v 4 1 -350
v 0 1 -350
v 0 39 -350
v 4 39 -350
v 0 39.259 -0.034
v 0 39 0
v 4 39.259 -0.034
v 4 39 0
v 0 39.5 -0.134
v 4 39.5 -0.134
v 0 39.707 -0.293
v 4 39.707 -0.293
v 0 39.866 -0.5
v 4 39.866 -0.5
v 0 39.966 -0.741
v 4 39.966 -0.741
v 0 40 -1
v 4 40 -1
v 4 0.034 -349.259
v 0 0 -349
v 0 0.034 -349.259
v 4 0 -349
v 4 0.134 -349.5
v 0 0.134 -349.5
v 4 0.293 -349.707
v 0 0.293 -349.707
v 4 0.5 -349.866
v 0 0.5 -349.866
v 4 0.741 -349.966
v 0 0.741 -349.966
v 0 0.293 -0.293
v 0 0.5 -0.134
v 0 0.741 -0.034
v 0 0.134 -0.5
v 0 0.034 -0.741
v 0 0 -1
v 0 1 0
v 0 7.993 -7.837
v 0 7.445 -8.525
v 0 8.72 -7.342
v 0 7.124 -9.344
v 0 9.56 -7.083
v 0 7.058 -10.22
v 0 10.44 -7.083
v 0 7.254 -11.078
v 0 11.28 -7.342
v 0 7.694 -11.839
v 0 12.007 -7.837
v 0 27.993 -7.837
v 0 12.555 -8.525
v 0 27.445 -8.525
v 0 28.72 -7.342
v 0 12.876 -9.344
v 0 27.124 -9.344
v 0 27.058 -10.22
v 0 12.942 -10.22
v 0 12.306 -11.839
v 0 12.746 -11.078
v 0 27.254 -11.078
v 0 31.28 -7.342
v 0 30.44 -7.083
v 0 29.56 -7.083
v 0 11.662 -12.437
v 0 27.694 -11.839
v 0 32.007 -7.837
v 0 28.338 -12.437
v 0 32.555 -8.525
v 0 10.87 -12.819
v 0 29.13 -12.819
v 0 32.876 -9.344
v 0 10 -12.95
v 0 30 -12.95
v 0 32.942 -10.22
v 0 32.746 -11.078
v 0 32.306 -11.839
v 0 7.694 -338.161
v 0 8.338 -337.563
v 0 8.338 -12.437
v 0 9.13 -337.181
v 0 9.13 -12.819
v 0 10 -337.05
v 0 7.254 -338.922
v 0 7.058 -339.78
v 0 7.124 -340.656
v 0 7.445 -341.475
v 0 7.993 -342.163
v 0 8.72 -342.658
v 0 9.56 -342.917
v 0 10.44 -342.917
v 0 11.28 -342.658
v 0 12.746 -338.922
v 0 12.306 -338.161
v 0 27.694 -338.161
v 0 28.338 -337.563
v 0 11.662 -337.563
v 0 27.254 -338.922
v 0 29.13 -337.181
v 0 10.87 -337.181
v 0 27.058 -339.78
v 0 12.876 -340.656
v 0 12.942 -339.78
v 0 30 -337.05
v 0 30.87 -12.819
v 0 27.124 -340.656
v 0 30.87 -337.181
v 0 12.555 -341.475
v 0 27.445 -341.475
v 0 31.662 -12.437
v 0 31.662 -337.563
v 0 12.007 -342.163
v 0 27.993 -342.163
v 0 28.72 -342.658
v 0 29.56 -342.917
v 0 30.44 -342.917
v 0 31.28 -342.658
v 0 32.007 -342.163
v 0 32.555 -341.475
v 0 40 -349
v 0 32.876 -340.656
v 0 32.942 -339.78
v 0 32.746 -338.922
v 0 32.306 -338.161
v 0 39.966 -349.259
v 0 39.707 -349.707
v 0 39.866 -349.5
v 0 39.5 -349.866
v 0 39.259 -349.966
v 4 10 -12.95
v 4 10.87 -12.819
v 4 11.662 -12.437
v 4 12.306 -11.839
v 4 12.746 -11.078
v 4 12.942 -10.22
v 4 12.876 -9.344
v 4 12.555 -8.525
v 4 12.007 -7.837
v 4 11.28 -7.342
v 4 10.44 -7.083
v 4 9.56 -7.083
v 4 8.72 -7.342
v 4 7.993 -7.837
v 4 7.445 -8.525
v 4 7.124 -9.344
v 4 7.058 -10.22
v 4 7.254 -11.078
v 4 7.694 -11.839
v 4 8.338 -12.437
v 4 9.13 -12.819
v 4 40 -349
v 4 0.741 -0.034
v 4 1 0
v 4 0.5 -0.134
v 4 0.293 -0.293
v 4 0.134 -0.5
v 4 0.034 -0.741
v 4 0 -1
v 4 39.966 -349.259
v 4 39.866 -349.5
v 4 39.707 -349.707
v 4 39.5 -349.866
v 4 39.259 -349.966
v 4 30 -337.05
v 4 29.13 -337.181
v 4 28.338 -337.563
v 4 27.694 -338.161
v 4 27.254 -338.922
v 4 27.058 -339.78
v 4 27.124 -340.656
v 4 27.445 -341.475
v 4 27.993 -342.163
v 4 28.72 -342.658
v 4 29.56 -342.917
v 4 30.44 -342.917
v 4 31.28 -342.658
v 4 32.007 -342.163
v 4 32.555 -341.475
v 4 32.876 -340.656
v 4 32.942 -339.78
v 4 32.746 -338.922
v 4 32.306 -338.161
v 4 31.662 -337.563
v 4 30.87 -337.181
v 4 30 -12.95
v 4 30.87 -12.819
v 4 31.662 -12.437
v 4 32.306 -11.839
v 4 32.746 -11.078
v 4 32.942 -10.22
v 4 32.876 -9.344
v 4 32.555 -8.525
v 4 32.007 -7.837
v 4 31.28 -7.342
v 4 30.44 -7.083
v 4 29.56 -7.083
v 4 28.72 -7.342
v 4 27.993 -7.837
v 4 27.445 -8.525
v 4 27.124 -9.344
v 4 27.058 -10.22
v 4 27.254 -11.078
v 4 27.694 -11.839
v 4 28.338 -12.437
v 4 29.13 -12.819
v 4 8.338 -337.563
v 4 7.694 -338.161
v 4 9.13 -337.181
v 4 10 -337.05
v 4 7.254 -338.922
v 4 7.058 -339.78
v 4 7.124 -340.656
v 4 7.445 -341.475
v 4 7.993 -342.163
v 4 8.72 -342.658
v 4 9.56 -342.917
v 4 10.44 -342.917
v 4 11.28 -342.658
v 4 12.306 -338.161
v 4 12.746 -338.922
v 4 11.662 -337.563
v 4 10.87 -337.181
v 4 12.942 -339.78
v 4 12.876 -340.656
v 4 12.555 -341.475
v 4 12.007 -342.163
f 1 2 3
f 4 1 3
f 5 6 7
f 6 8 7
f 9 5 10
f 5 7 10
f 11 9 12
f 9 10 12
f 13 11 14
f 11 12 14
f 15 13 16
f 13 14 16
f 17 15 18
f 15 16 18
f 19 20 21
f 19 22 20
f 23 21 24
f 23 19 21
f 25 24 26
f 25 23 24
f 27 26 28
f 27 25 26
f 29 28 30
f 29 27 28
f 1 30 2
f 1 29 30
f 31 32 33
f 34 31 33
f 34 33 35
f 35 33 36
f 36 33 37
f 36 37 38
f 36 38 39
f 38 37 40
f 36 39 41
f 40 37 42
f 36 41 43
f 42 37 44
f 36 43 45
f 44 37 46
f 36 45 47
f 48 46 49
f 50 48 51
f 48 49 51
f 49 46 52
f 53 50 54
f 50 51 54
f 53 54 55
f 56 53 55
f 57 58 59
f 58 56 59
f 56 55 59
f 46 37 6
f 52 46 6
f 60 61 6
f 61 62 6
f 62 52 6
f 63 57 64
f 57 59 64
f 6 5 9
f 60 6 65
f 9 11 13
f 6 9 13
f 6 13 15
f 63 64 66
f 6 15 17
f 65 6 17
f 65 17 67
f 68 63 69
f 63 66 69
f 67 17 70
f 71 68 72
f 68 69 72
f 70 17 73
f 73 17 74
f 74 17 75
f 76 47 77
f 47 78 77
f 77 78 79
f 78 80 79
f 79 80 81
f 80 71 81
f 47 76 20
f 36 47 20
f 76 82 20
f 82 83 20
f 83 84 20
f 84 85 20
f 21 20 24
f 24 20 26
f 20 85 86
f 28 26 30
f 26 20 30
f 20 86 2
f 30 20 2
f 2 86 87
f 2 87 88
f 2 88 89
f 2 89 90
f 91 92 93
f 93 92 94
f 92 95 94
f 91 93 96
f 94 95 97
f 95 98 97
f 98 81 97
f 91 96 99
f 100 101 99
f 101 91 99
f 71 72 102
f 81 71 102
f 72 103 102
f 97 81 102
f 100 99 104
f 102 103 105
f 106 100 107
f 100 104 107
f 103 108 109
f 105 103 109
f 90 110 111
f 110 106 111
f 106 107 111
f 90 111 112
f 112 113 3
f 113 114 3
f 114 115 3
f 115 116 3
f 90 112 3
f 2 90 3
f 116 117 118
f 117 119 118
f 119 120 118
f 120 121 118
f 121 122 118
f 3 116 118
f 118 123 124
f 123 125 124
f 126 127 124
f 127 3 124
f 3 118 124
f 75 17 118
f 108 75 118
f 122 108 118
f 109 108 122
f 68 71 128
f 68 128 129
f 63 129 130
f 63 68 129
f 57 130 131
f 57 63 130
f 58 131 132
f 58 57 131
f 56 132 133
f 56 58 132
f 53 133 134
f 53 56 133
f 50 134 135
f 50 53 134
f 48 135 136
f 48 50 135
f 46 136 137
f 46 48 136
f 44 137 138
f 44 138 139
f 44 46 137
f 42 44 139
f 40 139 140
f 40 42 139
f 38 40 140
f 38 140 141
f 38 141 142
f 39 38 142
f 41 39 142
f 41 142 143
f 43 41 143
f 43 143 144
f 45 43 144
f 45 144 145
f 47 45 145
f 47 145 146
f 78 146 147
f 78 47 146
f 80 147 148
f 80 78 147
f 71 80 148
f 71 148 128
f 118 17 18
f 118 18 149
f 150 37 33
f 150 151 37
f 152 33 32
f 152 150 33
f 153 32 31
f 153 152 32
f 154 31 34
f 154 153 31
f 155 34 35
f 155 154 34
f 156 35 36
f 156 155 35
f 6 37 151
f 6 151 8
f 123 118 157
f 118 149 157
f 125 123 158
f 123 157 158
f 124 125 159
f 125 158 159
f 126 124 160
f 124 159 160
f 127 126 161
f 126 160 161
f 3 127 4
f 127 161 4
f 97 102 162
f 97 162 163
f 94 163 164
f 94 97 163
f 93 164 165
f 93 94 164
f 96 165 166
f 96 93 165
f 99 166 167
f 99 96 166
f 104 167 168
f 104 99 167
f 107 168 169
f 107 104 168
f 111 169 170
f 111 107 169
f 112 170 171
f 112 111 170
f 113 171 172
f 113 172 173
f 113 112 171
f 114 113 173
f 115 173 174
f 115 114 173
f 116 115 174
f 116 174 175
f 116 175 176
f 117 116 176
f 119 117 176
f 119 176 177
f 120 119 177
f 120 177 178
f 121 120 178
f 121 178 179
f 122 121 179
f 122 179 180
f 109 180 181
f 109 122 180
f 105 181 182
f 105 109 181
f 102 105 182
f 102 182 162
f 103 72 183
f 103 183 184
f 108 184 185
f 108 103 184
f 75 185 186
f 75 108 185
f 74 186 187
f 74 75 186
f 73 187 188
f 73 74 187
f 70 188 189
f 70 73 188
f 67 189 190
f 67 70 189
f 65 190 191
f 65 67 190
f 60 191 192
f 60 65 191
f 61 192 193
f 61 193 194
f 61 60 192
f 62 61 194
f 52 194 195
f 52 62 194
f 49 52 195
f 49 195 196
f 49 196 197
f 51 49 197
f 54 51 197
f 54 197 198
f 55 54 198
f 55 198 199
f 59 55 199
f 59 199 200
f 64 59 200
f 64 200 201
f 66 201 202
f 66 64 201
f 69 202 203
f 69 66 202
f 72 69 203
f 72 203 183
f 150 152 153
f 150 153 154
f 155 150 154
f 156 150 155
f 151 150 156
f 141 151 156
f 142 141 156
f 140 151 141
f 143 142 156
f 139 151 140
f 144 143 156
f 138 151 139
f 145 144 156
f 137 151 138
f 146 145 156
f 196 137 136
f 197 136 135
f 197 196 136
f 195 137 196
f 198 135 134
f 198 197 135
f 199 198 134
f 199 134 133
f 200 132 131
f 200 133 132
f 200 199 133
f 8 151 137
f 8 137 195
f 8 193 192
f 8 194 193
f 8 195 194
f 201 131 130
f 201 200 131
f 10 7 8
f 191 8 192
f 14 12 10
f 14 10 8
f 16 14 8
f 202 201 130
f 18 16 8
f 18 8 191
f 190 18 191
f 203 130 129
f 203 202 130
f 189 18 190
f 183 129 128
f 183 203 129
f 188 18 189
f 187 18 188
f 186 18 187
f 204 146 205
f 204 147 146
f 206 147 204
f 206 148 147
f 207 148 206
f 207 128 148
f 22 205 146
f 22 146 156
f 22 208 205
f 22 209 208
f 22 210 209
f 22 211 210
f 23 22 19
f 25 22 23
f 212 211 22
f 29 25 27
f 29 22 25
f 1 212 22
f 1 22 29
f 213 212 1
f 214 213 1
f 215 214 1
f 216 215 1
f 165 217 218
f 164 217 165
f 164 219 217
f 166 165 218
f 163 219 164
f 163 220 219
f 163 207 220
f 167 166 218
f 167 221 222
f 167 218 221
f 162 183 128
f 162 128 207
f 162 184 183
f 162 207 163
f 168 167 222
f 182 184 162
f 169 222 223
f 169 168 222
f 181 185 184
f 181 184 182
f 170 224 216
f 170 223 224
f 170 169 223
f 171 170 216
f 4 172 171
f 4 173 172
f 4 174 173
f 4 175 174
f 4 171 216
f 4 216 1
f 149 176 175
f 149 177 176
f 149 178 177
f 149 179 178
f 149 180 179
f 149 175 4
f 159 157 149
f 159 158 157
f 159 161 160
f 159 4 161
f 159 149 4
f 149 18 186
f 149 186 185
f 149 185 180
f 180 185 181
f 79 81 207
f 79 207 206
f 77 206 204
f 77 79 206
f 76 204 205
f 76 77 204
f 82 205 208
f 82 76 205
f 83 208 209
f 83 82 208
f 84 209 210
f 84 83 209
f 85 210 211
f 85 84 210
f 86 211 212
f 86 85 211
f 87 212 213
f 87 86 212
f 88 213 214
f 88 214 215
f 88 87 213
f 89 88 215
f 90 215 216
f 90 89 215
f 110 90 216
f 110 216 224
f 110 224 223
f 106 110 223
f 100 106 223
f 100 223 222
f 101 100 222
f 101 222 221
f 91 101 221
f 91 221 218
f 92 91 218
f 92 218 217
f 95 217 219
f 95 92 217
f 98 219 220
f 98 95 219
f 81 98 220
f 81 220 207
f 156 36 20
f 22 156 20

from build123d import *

# Parameters (mm, degrees)
SKETCH_1_W      = 350
SKETCH_1_H      = 40
SKETCH_1_R      = 2.95
EXTRUDE_1_DEPTH = 4
FILLET_1_R      = 1


with BuildPart() as part:
    # 草图1 → 凸台-拉伸1 (new body)
    with BuildSketch(Plane(origin=(0, 0, 0), x_dir=(0, 0, -1), z_dir=(1, 0, 0))):
        with Locations((175, 20)):
            Rectangle(SKETCH_1_W, SKETCH_1_H)
        with Locations((10, 30)):
            Circle(SKETCH_1_R, mode=Mode.SUBTRACT)
        with Locations((10, 10)):
            Circle(SKETCH_1_R, mode=Mode.SUBTRACT)
        with Locations(Location((340, 10, 0), (0, 0, 180))):
            Circle(SKETCH_1_R, mode=Mode.SUBTRACT)
        with Locations(Location((340, 30, 0), (0, 0, 180))):
            Circle(SKETCH_1_R, mode=Mode.SUBTRACT)
    extrude(amount=EXTRUDE_1_DEPTH)

    # 圆角1
    fillet_1_edges = [part.edges().sort_by_distance(p)[0] for p in [
        (2, 40, 0),
        (2, 40, -350),
        (2, 0, -350),
        (2, 0, 0),
    ]]
    fillet(fillet_1_edges, radius=FILLET_1_R)


solid = part.part
